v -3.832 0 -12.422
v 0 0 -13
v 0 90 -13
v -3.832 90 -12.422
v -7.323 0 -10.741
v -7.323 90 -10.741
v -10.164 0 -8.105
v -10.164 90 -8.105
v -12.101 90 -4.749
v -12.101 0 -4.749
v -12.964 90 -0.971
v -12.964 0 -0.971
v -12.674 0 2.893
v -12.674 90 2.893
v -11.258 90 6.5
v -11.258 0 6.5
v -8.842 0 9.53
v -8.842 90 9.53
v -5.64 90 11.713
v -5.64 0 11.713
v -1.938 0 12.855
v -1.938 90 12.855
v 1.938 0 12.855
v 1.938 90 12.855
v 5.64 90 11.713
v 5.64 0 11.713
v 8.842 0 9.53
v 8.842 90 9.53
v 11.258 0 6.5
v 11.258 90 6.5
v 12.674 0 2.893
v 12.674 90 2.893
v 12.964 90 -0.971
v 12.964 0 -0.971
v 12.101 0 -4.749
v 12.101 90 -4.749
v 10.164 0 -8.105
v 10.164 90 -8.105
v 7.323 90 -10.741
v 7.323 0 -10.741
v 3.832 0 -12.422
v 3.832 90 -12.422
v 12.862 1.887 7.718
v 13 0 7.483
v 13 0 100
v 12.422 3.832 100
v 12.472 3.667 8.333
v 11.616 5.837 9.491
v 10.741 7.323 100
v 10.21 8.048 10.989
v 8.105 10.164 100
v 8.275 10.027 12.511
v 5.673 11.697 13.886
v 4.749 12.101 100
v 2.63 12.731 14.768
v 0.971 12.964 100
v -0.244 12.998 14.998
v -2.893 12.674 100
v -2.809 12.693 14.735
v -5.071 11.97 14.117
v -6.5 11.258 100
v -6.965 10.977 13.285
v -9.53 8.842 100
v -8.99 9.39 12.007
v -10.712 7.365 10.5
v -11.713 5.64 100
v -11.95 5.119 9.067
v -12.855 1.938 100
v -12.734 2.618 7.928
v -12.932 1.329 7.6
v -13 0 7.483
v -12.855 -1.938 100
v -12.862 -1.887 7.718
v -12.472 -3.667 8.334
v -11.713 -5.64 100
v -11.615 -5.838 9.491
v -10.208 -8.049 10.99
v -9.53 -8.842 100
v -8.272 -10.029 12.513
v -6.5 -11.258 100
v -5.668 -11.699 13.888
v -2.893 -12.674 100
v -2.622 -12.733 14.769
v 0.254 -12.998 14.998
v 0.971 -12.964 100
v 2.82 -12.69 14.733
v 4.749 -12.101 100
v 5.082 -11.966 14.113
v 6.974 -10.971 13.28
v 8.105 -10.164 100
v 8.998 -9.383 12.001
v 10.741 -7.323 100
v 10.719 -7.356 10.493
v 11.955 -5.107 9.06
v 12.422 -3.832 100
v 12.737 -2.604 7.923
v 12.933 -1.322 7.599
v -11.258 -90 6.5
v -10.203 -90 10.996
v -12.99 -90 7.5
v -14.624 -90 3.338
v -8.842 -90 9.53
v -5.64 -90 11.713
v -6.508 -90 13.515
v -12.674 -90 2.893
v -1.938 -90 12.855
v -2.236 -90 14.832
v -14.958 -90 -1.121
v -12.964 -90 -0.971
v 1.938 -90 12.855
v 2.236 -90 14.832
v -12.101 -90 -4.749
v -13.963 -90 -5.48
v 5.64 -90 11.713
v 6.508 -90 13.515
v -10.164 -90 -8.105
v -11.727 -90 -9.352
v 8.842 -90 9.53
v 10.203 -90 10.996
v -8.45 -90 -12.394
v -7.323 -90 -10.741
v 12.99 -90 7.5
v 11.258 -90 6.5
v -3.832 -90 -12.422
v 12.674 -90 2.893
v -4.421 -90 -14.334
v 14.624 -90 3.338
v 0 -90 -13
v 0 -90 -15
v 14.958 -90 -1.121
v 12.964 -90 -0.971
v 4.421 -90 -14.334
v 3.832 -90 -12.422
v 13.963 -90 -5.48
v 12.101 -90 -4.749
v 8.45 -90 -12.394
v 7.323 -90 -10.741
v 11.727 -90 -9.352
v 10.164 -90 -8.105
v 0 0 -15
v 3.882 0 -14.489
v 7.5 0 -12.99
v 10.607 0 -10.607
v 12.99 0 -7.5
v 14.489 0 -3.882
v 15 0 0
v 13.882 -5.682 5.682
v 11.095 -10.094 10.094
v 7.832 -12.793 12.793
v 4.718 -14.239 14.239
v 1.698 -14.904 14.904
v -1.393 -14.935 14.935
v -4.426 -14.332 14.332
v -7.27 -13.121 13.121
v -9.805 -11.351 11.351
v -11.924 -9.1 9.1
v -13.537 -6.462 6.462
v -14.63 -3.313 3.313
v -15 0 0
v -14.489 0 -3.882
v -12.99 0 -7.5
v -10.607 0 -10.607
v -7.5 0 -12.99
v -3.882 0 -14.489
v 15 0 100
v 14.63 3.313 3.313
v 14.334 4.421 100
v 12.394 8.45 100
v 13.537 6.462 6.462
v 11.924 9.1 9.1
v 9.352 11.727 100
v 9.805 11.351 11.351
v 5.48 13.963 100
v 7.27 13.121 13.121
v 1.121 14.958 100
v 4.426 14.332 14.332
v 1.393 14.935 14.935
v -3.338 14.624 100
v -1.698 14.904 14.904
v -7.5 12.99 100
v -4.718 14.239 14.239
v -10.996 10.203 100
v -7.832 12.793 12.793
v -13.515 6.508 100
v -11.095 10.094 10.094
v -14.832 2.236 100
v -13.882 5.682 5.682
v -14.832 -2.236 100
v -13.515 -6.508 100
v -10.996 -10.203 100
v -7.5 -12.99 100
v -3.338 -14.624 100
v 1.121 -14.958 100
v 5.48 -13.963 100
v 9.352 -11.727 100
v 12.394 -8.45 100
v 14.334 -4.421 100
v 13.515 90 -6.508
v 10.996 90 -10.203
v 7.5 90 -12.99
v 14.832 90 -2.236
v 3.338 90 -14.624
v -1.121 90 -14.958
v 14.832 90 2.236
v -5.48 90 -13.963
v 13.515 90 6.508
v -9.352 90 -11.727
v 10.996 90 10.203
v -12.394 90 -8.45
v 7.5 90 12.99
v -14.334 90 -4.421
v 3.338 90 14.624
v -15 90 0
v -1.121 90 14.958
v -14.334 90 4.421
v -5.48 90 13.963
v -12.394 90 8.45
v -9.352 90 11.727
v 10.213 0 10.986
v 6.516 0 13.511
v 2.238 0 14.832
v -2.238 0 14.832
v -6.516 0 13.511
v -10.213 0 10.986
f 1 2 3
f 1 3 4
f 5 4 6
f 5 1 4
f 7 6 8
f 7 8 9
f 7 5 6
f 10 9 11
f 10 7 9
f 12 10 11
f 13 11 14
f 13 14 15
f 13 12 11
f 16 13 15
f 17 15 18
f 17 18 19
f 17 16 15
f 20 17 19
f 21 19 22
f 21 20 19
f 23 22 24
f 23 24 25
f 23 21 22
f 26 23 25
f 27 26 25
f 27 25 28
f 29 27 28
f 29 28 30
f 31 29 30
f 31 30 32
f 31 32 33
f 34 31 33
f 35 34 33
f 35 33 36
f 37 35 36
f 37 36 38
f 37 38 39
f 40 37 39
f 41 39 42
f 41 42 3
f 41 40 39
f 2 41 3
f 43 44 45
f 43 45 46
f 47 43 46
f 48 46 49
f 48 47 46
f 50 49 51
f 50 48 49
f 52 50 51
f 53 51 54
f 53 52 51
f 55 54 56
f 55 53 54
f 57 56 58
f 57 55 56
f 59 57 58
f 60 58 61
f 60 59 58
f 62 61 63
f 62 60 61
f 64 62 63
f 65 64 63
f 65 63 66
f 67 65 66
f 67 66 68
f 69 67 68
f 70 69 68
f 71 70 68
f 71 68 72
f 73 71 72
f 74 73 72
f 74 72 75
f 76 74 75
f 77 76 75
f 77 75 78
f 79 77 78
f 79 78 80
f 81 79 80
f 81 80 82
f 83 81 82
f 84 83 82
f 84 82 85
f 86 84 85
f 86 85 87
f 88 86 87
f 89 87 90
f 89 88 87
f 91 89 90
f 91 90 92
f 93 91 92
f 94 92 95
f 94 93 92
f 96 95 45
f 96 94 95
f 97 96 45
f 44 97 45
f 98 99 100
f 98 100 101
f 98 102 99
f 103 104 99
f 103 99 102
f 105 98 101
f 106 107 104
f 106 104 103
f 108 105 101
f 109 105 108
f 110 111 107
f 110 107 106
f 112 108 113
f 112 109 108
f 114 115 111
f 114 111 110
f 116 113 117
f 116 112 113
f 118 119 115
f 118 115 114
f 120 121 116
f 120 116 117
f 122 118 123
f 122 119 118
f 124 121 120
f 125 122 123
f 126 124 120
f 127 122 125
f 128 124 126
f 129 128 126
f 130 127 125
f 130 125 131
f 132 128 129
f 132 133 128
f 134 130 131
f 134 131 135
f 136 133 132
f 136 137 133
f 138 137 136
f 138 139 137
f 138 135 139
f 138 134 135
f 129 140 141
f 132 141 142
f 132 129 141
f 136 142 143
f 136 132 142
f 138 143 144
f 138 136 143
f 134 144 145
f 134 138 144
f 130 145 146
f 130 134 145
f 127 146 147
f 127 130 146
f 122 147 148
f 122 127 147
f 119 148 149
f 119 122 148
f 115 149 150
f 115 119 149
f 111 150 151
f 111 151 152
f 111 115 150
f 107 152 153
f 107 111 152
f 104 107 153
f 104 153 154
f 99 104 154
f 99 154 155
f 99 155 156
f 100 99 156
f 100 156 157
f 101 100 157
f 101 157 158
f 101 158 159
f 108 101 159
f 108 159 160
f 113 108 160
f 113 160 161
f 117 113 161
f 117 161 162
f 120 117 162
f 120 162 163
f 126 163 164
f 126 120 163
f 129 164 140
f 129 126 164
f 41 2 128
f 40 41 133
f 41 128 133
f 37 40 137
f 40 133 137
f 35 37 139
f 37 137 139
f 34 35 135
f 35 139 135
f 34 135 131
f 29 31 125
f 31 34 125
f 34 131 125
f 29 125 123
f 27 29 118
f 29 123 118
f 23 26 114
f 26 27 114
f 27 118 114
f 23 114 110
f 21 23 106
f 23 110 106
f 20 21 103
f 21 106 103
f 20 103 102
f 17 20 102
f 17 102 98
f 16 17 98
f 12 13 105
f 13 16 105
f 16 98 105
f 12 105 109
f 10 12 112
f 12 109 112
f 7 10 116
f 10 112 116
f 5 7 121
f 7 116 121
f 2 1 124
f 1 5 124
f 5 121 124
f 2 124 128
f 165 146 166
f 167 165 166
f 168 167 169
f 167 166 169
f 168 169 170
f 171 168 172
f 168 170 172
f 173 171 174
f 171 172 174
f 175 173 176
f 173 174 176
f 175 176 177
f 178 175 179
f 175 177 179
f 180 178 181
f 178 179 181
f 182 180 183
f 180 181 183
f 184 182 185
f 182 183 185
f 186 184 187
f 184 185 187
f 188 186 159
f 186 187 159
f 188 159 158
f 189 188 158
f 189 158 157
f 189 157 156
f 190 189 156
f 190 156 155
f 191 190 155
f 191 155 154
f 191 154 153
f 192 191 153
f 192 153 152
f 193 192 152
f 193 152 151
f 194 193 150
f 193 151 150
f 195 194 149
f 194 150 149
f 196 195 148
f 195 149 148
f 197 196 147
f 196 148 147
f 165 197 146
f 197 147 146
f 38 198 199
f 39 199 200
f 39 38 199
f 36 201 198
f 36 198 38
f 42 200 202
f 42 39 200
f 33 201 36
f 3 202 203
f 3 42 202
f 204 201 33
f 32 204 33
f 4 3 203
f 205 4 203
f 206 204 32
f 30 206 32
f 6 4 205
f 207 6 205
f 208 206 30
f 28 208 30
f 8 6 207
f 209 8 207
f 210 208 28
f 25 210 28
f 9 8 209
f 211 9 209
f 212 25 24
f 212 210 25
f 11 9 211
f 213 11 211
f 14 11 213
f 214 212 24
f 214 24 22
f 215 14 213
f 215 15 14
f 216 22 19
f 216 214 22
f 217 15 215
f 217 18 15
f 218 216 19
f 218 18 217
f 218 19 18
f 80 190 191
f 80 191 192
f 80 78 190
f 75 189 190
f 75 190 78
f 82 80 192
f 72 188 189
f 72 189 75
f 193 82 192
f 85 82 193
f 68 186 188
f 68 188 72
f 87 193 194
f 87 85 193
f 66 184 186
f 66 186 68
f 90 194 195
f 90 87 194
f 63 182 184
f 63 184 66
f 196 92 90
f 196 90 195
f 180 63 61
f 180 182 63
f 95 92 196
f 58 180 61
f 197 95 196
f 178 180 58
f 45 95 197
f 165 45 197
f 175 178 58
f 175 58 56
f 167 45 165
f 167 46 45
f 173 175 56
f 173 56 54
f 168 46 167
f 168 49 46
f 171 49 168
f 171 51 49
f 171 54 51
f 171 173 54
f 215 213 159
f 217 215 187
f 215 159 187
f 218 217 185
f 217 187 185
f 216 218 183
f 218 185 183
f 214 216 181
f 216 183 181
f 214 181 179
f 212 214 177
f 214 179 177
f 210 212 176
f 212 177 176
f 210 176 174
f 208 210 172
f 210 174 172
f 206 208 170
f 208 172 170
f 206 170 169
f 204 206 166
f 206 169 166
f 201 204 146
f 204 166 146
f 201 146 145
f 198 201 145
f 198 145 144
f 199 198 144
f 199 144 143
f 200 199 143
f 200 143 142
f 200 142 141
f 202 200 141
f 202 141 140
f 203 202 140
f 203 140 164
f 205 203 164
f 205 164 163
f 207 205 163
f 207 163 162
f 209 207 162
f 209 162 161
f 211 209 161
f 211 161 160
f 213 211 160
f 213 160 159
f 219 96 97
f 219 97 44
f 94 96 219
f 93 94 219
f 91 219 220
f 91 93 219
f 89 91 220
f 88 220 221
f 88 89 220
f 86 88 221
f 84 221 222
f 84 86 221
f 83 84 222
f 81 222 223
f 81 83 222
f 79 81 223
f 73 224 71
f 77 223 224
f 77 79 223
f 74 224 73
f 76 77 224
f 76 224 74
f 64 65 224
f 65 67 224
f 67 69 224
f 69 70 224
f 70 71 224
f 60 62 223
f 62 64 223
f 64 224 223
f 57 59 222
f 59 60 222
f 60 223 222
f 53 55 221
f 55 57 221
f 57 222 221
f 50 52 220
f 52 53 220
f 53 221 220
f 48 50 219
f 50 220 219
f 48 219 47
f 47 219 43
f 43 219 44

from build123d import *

# Parameters (mm, degrees)
SKETCH1_R               = 15
SKETCH1_R_2             = 13
BOSS_EXTRUDE1_DEPTH     = 100
SKETCH2_R               = 15
CUT_EXTRUDE1_DEPTH      = 100
CUT_EXTRUDE4_DEPTH      = 103.225241628
CUT_EXTRUDE4_DEPTH_BACK = 103.225241628
SKETCH3_R               = 15
SKETCH4_R               = 15
SKETCH4_R_2             = 13
BOSS_EXTRUDE3_DEPTH     = 90
BOSS_EXTRUDE4_START     = 90
SKETCH6_R               = 15
SKETCH6_R_2             = 13
BOSS_EXTRUDE4_DEPTH     = 90


with BuildPart() as part:
    # Sketch1 → Boss-Extrude1 (new body)
    with BuildSketch(Plane.XY):
        Circle(SKETCH1_R)
        Circle(SKETCH1_R_2, mode=Mode.SUBTRACT)
    extrude(amount=BOSS_EXTRUDE1_DEPTH)

    # Sketch2 → Cut-Extrude1 (cut)
    with BuildSketch(Plane(origin=(0, 0, 0), x_dir=(1, 0, 0), z_dir=(0, 1, 0))):
        Circle(SKETCH2_R)
    extrude(amount=-CUT_EXTRUDE1_DEPTH, mode=Mode.SUBTRACT)

    # Sketch3 → Cut-Extrude4 (cut, two sides: drawn at the far end of the back side and taken through both)
    with BuildSketch(Plane(origin=(0, 0, 0), x_dir=(1, 0, 0), z_dir=(0, 1, 0)).offset(-CUT_EXTRUDE4_DEPTH_BACK)):
        Circle(SKETCH3_R)
    extrude(amount=CUT_EXTRUDE4_DEPTH + CUT_EXTRUDE4_DEPTH_BACK, mode=Mode.SUBTRACT)

    # Sketch4 → Boss-Extrude3 (add)
    with BuildSketch(Plane(origin=(0, 0, 0), x_dir=(1, 0, 0), z_dir=(0, 1, 0))):
        with Locations(Location((0, 0, 0), (0, 0, 180))):
            Circle(SKETCH4_R)
        with Locations(Location((0, 0, 0), (0, 0, 90))):
            Circle(SKETCH4_R_2, mode=Mode.SUBTRACT)
    extrude(amount=BOSS_EXTRUDE3_DEPTH)

    # Sketch6 → Boss-Extrude4 (add)
    with BuildSketch(Plane.XZ.offset(BOSS_EXTRUDE4_START)):
        with Locations(Location((0, 0, 0), (0, 0, 270))):
            Circle(SKETCH6_R)
        with Locations(Location((0, 0, 0), (0, 0, 270))):
            Circle(SKETCH6_R_2, mode=Mode.SUBTRACT)
    extrude(amount=-BOSS_EXTRUDE4_DEPTH)


solid = part.part
